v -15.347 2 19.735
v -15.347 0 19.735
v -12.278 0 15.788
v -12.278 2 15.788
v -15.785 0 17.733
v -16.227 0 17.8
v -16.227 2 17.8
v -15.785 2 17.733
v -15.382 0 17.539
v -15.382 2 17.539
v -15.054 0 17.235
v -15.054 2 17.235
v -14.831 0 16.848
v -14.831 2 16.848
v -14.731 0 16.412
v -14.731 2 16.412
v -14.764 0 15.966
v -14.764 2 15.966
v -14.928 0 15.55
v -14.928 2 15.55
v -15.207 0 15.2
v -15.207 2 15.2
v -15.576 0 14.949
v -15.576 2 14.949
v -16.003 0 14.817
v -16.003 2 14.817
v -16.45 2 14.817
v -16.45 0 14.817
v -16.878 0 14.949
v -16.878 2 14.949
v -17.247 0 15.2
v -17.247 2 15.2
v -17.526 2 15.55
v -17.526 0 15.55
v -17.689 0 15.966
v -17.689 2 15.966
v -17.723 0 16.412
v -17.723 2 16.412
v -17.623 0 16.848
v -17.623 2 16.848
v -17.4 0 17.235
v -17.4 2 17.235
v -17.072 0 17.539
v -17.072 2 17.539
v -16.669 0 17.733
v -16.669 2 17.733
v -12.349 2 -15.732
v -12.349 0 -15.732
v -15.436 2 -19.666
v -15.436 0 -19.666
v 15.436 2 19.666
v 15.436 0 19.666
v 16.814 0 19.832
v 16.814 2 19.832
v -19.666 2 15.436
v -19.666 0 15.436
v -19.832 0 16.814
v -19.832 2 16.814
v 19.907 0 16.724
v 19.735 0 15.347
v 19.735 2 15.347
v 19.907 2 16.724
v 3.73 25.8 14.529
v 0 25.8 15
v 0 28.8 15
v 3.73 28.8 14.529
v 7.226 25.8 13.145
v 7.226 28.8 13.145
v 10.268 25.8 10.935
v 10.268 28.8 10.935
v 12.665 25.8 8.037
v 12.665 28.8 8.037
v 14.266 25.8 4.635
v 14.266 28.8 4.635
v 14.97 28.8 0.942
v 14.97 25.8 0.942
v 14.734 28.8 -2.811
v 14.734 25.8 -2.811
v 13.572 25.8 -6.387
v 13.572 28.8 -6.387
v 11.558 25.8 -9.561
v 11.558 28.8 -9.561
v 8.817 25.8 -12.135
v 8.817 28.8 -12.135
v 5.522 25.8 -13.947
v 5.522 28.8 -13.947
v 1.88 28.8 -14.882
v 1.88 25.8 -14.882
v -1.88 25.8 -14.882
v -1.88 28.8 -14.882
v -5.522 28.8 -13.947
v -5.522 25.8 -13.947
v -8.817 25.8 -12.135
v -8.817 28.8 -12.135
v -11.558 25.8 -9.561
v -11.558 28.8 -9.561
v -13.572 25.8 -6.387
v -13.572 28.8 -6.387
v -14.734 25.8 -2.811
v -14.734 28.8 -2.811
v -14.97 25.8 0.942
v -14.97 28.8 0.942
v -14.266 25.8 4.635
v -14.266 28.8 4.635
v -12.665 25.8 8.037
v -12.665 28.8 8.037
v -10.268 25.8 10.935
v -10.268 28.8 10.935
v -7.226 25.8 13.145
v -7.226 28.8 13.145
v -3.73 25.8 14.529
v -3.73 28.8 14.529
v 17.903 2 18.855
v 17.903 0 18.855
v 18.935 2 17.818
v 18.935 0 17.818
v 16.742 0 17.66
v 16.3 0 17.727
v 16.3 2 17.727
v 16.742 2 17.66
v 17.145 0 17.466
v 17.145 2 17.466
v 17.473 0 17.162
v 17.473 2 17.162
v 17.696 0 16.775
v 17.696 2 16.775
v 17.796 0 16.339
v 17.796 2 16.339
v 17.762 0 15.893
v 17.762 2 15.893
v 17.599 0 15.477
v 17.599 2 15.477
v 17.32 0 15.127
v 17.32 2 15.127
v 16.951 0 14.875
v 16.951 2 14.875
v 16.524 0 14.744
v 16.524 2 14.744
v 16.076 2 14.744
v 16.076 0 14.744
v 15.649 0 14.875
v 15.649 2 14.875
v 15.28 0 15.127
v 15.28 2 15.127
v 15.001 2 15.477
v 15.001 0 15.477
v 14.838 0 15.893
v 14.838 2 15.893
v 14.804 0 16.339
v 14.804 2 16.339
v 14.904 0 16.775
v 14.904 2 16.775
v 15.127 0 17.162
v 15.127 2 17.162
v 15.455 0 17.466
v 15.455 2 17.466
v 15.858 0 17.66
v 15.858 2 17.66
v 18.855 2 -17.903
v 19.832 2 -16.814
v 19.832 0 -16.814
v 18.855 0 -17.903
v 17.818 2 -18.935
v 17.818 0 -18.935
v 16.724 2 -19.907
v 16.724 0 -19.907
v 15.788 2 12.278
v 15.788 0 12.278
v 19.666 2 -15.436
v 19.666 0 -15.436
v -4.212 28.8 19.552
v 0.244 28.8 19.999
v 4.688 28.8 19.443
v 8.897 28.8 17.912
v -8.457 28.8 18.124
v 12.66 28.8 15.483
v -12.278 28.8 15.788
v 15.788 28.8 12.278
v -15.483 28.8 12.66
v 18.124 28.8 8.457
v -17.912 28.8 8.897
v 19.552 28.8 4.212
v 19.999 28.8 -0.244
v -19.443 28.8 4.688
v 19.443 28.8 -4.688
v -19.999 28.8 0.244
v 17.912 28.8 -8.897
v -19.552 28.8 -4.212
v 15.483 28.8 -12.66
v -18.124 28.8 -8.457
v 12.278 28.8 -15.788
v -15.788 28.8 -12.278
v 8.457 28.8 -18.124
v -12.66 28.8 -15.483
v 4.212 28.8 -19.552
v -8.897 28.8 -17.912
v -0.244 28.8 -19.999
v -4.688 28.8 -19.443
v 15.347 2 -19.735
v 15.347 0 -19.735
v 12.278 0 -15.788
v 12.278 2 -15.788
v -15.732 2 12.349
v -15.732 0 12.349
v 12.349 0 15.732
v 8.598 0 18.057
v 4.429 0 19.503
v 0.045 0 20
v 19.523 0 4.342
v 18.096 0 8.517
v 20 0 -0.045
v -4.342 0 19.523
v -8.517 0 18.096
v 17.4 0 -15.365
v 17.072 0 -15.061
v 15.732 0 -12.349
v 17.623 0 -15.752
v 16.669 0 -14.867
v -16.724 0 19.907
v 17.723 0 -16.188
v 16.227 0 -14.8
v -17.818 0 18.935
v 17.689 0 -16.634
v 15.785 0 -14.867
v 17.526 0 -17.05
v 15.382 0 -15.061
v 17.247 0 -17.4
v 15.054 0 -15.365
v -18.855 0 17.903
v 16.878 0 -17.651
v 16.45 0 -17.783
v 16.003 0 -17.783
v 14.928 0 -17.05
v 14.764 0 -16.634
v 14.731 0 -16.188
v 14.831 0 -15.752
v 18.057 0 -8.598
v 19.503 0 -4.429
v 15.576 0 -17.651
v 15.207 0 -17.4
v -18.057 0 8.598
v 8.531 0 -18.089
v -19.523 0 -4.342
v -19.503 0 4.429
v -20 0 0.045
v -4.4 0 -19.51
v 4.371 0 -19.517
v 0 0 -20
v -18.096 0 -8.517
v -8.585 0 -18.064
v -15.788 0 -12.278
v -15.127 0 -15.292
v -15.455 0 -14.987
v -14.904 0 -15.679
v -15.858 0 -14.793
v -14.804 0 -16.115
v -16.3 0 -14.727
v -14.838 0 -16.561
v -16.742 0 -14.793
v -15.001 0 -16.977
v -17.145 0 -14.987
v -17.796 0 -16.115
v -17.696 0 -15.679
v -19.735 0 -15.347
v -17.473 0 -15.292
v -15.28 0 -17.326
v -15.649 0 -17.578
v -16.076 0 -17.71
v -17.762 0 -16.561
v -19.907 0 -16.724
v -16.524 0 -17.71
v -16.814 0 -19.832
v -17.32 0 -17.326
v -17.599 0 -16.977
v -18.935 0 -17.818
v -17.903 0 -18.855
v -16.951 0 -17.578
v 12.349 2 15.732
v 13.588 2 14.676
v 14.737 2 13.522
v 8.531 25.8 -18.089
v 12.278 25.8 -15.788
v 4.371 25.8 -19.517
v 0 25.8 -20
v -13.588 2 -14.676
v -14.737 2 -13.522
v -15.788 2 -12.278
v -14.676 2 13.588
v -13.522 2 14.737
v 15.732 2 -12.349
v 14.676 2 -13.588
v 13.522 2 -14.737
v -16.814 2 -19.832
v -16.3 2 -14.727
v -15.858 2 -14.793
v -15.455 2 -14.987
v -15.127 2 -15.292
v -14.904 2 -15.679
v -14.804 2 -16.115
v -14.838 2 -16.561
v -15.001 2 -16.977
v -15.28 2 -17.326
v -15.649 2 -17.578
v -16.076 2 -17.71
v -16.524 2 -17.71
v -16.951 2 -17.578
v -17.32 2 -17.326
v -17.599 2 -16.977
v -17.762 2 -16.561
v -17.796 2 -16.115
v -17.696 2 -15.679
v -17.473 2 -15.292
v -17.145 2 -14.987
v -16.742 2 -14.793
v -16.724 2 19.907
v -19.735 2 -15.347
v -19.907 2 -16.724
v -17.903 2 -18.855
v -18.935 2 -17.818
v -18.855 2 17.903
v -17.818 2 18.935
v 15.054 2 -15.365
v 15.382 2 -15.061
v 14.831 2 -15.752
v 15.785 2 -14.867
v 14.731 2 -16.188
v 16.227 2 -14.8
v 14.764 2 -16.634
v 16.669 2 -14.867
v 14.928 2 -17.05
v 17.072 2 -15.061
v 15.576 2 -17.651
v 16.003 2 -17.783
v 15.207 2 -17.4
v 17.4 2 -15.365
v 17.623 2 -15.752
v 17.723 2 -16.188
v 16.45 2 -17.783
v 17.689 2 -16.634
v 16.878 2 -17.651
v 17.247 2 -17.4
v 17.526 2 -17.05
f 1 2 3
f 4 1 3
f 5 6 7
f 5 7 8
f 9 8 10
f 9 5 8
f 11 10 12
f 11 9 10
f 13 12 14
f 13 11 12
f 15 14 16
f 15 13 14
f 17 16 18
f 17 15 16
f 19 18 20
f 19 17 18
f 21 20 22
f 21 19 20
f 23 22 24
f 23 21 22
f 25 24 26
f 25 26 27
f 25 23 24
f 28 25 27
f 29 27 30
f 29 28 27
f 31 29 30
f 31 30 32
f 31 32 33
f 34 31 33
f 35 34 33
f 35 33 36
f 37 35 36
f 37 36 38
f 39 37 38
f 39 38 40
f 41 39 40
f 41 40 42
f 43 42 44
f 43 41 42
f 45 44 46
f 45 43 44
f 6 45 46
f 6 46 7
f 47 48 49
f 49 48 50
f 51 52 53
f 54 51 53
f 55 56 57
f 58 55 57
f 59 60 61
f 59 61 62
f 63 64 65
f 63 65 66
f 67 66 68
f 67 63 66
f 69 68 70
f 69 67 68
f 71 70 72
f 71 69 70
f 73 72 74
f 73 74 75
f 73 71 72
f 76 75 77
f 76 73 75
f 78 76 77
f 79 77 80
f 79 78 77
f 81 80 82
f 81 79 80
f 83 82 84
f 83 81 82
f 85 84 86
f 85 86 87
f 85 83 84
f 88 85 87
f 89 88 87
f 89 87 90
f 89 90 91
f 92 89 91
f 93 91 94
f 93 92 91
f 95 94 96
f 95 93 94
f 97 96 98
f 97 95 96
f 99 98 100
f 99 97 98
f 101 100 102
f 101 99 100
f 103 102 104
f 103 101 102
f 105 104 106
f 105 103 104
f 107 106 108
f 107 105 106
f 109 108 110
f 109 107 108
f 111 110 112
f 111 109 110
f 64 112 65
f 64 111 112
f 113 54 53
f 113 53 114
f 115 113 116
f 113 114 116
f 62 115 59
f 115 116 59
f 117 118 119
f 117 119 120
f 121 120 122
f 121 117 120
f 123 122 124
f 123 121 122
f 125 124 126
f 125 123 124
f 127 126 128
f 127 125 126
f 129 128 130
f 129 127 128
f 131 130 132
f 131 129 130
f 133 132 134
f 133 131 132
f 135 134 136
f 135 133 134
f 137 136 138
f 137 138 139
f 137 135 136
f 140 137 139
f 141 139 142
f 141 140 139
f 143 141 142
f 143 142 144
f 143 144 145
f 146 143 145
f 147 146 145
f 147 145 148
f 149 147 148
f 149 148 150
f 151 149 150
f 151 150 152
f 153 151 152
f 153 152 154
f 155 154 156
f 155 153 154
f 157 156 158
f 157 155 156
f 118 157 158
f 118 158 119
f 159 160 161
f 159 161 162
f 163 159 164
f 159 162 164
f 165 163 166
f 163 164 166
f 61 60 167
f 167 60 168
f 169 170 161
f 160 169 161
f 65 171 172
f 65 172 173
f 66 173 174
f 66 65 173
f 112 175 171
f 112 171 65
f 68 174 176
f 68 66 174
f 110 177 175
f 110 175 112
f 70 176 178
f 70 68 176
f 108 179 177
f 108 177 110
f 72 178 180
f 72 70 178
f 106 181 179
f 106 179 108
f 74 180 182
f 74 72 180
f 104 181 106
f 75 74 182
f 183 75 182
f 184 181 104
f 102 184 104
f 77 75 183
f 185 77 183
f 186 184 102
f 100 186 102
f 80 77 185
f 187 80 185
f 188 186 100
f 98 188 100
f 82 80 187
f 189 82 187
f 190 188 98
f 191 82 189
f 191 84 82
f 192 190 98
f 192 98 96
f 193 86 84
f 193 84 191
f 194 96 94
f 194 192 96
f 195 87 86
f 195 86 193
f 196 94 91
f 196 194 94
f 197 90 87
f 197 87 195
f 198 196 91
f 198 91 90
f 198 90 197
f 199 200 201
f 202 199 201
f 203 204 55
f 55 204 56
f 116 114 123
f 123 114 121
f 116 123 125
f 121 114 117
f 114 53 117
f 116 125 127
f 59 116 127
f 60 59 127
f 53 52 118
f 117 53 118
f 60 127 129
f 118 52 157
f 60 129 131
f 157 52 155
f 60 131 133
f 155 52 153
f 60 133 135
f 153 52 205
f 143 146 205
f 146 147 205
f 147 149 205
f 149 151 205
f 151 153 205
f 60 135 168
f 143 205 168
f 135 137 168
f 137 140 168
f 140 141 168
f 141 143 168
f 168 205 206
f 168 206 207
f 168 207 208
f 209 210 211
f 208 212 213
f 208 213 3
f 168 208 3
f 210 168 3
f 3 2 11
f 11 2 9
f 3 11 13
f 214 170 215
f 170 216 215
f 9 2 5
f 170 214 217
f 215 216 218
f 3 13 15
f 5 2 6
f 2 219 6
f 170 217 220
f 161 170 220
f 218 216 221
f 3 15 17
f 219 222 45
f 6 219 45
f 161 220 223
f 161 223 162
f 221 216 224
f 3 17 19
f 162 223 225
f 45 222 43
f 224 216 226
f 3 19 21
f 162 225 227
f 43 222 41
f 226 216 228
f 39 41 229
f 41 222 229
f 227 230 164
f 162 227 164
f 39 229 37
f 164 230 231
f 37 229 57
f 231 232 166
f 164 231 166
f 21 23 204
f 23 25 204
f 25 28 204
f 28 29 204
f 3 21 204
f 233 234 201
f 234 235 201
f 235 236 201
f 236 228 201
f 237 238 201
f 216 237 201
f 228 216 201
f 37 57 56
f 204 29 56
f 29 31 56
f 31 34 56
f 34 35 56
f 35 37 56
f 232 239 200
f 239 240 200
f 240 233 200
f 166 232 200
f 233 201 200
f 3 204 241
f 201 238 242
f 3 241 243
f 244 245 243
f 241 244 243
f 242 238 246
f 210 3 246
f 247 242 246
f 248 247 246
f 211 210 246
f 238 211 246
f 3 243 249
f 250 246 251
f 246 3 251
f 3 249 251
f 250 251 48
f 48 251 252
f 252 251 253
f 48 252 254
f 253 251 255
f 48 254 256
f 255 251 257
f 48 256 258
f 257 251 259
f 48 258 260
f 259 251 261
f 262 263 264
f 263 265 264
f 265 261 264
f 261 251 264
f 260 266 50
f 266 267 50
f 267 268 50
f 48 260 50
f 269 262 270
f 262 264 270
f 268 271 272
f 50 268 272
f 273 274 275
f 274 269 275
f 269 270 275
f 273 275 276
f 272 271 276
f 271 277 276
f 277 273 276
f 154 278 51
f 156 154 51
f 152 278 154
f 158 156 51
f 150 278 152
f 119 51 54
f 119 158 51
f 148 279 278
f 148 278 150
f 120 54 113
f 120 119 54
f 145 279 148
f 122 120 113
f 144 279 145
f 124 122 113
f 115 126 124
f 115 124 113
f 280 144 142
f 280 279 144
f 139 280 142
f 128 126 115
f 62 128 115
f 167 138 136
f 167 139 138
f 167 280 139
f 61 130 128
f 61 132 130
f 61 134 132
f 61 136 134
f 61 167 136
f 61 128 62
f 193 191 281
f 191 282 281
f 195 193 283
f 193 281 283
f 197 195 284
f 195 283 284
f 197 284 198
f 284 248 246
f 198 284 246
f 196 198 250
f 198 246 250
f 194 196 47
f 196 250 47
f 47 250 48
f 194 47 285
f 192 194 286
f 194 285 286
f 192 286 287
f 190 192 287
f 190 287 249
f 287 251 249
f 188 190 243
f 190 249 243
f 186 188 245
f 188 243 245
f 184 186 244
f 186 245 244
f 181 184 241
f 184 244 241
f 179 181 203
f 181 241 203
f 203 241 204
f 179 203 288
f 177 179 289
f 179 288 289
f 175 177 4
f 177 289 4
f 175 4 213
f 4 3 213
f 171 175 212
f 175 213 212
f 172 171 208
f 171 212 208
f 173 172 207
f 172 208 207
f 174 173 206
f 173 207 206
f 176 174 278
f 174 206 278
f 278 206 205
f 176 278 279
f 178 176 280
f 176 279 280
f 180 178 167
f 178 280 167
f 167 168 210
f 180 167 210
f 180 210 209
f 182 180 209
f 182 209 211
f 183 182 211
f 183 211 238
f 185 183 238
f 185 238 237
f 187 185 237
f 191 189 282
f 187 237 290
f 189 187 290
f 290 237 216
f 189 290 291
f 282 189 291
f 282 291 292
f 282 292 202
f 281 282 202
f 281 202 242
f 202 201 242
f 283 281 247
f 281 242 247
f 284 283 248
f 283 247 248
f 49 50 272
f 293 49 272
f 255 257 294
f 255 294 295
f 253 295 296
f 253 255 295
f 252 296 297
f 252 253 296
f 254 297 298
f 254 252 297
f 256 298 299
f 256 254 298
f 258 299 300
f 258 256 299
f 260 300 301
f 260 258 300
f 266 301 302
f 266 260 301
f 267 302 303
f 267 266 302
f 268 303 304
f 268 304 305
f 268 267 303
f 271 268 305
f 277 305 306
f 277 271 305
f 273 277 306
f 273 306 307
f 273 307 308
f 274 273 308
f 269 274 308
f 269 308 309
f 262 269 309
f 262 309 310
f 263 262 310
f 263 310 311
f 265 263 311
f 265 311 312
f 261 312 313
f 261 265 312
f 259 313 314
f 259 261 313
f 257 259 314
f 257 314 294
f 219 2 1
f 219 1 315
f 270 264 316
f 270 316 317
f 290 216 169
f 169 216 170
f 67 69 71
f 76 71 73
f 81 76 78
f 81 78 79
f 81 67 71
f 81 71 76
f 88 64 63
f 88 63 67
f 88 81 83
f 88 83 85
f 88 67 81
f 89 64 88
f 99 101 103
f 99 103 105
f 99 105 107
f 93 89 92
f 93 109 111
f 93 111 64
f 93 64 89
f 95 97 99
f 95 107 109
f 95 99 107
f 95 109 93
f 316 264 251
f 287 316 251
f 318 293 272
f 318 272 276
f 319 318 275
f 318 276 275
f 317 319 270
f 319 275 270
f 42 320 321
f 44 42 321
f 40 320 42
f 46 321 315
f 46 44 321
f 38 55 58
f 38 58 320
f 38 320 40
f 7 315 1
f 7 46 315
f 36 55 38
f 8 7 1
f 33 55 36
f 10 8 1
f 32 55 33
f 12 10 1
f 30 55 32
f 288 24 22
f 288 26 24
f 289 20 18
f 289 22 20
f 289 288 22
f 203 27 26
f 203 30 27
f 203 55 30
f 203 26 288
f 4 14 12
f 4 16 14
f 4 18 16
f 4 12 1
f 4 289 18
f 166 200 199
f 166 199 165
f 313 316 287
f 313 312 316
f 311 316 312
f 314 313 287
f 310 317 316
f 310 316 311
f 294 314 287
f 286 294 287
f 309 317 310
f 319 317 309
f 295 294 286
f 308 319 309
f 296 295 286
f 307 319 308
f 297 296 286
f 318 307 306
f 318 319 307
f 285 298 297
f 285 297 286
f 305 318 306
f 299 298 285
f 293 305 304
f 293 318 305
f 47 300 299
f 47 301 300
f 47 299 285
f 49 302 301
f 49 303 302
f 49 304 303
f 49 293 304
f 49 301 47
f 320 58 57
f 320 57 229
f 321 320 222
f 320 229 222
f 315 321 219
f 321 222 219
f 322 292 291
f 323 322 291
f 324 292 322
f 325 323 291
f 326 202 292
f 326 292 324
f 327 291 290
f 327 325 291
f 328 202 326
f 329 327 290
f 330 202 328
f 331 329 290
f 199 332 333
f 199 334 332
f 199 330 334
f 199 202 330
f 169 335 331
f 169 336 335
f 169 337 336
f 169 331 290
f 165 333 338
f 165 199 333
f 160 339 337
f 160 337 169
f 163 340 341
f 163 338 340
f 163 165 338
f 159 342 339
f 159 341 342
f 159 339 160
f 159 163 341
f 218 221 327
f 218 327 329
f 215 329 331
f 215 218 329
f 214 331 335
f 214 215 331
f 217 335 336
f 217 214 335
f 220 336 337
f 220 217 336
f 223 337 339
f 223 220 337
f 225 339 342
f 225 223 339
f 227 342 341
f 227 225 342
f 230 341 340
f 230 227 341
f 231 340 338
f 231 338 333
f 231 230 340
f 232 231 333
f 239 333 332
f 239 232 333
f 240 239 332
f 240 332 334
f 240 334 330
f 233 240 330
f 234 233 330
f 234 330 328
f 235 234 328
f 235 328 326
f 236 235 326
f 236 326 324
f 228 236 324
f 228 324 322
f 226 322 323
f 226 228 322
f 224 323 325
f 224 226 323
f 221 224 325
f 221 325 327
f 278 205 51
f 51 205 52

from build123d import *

# Parameters (mm, degrees)
SKETCH1_R           = 20
BOSS_EXTRUDE1_DEPTH = 25.8
SKETCH2_R           = 1.5
BOSS_EXTRUDE4_DEPTH = 2
CHAMFER1_SIZE       = 1
SKETCH3_R           = 20
SKETCH3_R_2         = 15
BOSS_EXTRUDE5_DEPTH = 3


with BuildPart() as part:
    # Sketch1 → Boss-Extrude1 (new body)
    with BuildSketch(Plane(origin=(0, 0, 0), x_dir=(1, 0, 0), z_dir=(0, 1, 0))):
        with Locations(Location((0, 0, 0), (0, 0, 90))):
            Circle(SKETCH1_R)
    extrude(amount=BOSS_EXTRUDE1_DEPTH)

    # Sketch2 → Boss-Extrude4 (add)
    # profile 1 of 4: a face of its own
    with BuildSketch(Plane(origin=(0, 0, 0), x_dir=(1, 0, 0), z_dir=(0, 1, 0))):
        with BuildLine():
            Line((-12.348666302, 15.732464542), (-16.053266193, 20.452203904))
            ThreePointArc((-16.053266193, 20.452203904), (-18.426104242, 18.343355267), (-20.524251517, 15.961049453))
            Line((-20.524251517, 15.961049453), (-15.787885783, 12.277730349))
            ThreePointArc((-15.787885783, 12.277730349), (-14.17392634, 14.110273282), (-12.348666302, 15.732464542))
        make_face()
        with Locations(Location((-16.300015291, 16.226814275, 0), (0, 0, 270))):
            Circle(SKETCH2_R, mode=Mode.SUBTRACT)
    # profile 2 of 4: a face of its own
    with BuildSketch(Plane(origin=(0, 0, 0), x_dir=(1, 0, 0), z_dir=(0, 1, 0))):
        with BuildLine():
            Line((15.732464542, 12.348666302), (20.452203904, 16.053266193))
            ThreePointArc((20.452203904, 16.053266193), (18.343355267, 18.426104242), (15.961049453, 20.524251517))
            Line((15.961049453, 20.524251517), (12.277730349, 15.787885783))
            ThreePointArc((12.277730349, 15.787885783), (14.110273282, 14.17392634), (15.732464542, 12.348666302))
        make_face()
        with Locations(Location((16.226814275, 16.300015291, 0), (0, 0, 270))):
            Circle(SKETCH2_R, mode=Mode.SUBTRACT)
    # profile 3 of 4: a face of its own
    with BuildSketch(Plane(origin=(0, 0, 0), x_dir=(1, 0, 0), z_dir=(0, 1, 0))):
        with BuildLine():
            Line((12.348666302, -15.732464542), (16.053266193, -20.452203904))
            ThreePointArc((16.053266193, -20.452203904), (18.426104242, -18.343355267), (20.524251517, -15.961049453))
            Line((20.524251517, -15.961049453), (15.787885783, -12.277730349))
            ThreePointArc((15.787885783, -12.277730349), (14.17392634, -14.110273282), (12.348666302, -15.732464542))
        make_face()
        with Locations(Location((16.300015291, -16.226814275, 0), (0, 0, 270))):
            Circle(SKETCH2_R, mode=Mode.SUBTRACT)
    # profile 4 of 4: a face of its own
    with BuildSketch(Plane(origin=(0, 0, 0), x_dir=(1, 0, 0), z_dir=(0, 1, 0))):
        with BuildLine():
            Line((-15.732464542, -12.348666302), (-20.452203904, -16.053266193))
            ThreePointArc((-20.452203904, -16.053266193), (-18.343355267, -18.426104242), (-15.961049453, -20.524251517))
            Line((-15.961049453, -20.524251517), (-12.277730349, -15.787885783))
            ThreePointArc((-12.277730349, -15.787885783), (-14.110273282, -14.17392634), (-15.732464542, -12.348666302))
        make_face()
        with Locations(Location((-16.226814275, -16.300015291, 0), (0, 0, 270))):
            Circle(SKETCH2_R, mode=Mode.SUBTRACT)
    extrude(amount=BOSS_EXTRUDE4_DEPTH)

    # Chamfer1
    # the kernel refuses this chamfer: 1 mm, written as the material it takes off along each edge
    with BuildSketch(Plane(origin=(-20.452203904, -2.571682988, 16.053266193), x_dir=(0.786623227084006, 0, -0.6174333151134171), z_dir=(0, 1, 0)), Plane(origin=(16.053266193, -2.571682988, 20.452203904), x_dir=(-0.6174333151134189, 0, -0.7866232270840047), z_dir=(0, 1, 0)), Plane(origin=(20.452203904, -2.571682988, -16.053266193), x_dir=(-0.7866232270840033, 0, 0.6174333151134205), z_dir=(0, 1, 0)), Plane(origin=(-16.053266193, -2.571682988, -20.452203904), x_dir=(0.6174333151134251, 0, 0.7866232270839999), z_dir=(0, 1, 0))) as chamfer1_piece_1:
        with BuildLine():
            Line((CHAMFER1_SIZE, 0), (0.018531237, -0.981468763))
            ThreePointArc((0.018531237, -0.981468763), (0.004898706, -0.504686734), (0, 0))
            Line((0, 0), (CHAMFER1_SIZE, 0))
        make_face()
    extrude(amount=7.143365976, mode=Mode.SUBTRACT)
    with BuildSketch(Plane(origin=(-15.961049453, -2.571682988, 20.524251517), x_dir=(0.6138865174304216, 0, -0.7893942891338579), z_dir=(0, 1, 0)), Plane(origin=(20.524251517, -2.571682988, 15.961049453), x_dir=(-0.7893942891338613, 0, -0.6138865174304171), z_dir=(0, 1, 0)), Plane(origin=(15.961049453, -2.571682988, -20.524251517), x_dir=(-0.6138865174304153, 0, 0.7893942891338627), z_dir=(0, 1, 0)), Plane(origin=(-20.524251517, -2.571682988, -15.961049453), x_dir=(0.7893942891338679, 0, 0.6138865174304086), z_dir=(0, 1, 0))) as chamfer1_piece_2:
        with BuildLine():
            Line((CHAMFER1_SIZE, 0), (0.018531237, 0.981468763))
            ThreePointArc((0.018531237, 0.981468763), (0.004898706, 0.504686734), (0, 0))
            Line((0, 0), (CHAMFER1_SIZE, 0))
        make_face()
    extrude(amount=7.143365976, mode=Mode.SUBTRACT)

    # Sketch3 → Boss-Extrude5 (add)
    with BuildSketch(Plane(origin=(0, 25.8, 0), x_dir=(1, 0, 0), z_dir=(0, 1, 0))):
        with Locations(Location((0, 0, 0), (0, 0, 52.128942853))):
            Circle(SKETCH3_R)
        with Locations(Location((0, 0, 0), (0, 0, 270))):
            Circle(SKETCH3_R_2, mode=Mode.SUBTRACT)
    extrude(amount=BOSS_EXTRUDE5_DEPTH)


solid = part.part
